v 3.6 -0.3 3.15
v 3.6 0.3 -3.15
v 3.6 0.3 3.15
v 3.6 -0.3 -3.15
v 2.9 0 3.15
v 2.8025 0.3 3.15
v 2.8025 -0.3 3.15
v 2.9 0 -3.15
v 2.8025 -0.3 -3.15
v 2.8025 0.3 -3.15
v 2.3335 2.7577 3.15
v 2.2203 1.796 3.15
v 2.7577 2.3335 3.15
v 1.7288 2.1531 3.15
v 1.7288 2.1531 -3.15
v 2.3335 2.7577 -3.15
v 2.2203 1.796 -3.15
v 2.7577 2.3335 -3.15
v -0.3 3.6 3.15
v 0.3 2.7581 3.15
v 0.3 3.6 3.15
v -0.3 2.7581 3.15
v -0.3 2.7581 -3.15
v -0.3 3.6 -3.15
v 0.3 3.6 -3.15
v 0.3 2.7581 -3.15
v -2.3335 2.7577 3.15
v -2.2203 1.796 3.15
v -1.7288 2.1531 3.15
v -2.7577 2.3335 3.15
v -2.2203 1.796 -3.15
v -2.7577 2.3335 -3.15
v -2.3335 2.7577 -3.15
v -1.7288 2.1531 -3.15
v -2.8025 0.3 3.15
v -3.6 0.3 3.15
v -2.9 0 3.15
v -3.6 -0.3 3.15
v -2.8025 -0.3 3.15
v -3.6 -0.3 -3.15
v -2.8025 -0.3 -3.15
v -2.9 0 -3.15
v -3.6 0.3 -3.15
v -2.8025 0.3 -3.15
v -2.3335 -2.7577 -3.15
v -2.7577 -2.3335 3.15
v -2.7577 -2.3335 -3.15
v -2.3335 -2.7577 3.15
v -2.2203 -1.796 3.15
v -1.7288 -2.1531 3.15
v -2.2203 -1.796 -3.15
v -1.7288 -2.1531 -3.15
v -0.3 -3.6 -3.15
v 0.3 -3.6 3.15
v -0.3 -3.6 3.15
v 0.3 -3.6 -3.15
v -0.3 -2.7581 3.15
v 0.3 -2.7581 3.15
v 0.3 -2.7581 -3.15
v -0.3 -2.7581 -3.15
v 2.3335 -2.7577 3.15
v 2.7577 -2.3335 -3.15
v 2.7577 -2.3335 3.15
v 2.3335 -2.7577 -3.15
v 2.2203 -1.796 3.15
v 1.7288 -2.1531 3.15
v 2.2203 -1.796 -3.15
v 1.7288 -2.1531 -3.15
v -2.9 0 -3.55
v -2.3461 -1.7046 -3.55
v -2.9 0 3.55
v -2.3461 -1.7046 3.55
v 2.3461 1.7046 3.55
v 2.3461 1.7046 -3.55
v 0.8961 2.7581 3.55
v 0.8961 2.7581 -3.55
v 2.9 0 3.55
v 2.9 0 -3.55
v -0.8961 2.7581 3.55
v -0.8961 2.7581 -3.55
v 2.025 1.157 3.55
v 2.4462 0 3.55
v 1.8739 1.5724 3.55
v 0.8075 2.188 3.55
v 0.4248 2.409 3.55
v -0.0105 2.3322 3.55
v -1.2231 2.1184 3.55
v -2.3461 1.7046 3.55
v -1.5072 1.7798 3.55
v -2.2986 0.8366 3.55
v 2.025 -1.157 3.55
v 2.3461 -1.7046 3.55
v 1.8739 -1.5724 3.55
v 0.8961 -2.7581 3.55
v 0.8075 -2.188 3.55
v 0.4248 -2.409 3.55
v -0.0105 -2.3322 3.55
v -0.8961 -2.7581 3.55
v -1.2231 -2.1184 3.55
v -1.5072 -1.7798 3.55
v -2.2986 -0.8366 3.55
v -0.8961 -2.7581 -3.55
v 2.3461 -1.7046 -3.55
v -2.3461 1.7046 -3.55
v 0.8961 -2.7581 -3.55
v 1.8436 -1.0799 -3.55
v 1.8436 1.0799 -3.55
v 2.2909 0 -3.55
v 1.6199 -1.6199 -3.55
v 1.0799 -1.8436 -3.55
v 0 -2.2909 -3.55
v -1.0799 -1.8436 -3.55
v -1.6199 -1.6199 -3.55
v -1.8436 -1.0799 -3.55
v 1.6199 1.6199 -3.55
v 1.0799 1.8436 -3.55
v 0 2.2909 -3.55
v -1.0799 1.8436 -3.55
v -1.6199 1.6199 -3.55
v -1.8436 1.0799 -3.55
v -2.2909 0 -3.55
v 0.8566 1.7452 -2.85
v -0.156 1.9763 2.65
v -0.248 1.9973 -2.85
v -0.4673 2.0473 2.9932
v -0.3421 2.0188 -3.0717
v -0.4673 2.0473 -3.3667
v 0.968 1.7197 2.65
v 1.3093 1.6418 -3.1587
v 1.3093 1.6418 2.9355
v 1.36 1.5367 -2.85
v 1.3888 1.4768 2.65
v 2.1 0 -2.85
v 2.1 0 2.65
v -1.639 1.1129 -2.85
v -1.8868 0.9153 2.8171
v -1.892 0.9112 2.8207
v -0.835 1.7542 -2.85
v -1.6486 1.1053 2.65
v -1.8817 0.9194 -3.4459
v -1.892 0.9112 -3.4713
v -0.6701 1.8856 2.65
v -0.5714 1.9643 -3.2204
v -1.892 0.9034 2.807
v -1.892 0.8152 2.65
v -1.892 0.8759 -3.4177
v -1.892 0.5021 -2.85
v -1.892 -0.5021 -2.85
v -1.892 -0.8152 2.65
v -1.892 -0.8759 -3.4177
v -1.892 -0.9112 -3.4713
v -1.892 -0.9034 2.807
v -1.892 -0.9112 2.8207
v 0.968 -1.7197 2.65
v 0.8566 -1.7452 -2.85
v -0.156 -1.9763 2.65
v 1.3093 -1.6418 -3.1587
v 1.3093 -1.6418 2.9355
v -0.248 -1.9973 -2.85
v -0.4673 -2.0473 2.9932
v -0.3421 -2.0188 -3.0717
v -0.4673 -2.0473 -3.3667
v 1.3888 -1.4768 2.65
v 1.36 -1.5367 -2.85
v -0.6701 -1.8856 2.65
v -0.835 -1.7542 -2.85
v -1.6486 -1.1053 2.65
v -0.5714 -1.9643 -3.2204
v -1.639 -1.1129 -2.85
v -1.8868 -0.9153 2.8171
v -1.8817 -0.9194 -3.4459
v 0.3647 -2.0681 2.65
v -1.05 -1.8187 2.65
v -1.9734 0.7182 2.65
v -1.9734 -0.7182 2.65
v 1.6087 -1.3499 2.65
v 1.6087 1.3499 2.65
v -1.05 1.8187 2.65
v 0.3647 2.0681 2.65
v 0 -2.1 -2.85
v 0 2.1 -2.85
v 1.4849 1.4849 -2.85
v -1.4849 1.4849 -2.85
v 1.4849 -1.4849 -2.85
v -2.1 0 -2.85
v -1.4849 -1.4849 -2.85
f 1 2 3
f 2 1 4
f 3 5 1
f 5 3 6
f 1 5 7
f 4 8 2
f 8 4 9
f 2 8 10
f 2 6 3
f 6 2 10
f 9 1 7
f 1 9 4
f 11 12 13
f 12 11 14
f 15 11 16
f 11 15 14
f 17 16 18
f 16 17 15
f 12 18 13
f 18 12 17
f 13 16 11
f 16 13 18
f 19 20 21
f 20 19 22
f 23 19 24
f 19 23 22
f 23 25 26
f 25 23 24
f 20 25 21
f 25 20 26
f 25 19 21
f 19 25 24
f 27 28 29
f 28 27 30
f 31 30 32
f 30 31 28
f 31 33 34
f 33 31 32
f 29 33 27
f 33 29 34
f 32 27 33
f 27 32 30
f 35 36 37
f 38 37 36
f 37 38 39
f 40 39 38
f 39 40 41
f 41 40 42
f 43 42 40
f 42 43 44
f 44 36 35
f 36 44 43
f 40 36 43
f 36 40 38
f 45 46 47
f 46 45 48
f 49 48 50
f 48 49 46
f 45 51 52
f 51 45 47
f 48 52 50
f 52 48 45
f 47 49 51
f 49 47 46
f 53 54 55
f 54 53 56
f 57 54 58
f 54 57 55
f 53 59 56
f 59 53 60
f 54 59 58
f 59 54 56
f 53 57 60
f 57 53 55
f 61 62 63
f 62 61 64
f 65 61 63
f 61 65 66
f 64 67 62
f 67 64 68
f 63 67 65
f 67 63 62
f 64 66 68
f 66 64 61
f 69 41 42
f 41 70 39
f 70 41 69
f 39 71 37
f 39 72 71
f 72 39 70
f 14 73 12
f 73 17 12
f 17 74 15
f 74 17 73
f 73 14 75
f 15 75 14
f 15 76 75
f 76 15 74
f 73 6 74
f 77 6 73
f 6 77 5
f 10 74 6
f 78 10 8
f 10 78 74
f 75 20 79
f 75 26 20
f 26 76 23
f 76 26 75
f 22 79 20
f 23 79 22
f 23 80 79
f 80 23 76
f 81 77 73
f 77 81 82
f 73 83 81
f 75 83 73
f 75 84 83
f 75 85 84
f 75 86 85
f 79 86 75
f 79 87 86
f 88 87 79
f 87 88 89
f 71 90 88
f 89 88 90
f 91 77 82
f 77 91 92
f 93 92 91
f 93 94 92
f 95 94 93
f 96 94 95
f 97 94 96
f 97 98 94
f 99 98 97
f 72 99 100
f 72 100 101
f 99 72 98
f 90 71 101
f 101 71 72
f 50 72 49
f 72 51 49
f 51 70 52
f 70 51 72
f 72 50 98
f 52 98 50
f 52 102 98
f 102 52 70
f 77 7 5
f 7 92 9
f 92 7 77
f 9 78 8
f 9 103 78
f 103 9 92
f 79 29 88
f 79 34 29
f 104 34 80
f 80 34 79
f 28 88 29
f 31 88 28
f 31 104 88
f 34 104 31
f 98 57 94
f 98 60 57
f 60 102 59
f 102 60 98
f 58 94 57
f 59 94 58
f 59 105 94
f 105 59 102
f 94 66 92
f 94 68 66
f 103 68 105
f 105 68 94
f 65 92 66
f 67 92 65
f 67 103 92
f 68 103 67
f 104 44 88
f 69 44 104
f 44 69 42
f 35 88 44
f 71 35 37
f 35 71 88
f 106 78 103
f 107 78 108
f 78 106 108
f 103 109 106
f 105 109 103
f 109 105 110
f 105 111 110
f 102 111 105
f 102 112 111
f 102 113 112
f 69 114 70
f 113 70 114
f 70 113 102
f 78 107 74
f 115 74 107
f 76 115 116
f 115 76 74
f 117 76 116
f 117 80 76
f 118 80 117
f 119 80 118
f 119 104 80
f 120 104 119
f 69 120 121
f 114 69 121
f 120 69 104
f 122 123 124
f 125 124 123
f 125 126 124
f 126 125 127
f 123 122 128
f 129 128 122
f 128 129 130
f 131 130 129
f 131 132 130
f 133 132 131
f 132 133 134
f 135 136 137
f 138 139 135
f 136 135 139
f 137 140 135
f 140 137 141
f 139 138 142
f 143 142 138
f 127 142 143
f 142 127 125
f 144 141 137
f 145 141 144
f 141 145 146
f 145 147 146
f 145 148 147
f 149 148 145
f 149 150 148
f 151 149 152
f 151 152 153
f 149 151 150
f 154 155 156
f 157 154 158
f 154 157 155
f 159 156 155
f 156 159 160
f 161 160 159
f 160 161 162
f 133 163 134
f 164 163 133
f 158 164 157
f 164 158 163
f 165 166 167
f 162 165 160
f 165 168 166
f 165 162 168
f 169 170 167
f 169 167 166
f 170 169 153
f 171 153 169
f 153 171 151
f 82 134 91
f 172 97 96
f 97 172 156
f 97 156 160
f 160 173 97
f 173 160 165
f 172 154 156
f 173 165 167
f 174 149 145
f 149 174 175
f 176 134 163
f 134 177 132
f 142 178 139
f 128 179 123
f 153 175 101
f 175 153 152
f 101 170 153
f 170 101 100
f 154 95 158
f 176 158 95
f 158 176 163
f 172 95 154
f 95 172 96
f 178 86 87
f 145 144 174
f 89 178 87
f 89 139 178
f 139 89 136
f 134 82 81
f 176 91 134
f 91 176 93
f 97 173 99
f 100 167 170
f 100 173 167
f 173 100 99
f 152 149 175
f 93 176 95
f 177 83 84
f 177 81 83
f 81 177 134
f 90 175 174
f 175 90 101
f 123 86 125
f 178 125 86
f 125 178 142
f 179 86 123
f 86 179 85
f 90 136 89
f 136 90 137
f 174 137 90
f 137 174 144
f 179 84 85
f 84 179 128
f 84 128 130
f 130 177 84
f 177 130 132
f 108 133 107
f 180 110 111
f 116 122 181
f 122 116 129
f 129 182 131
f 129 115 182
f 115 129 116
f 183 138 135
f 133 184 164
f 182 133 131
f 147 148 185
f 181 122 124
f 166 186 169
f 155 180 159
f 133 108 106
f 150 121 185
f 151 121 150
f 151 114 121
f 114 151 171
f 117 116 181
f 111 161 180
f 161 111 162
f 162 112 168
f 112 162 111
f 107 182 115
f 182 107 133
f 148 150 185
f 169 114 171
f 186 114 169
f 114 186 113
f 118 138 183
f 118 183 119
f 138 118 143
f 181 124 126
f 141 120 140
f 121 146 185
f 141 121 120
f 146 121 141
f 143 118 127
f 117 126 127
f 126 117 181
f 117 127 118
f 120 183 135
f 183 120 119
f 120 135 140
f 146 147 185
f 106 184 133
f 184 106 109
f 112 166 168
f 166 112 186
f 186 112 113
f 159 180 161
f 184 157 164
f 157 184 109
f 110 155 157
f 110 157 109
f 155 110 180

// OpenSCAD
// Parameters
outer_diameter_mm = 5.8; //[2.9:11.6:0.1]
length_mm = 7.1; //[3.55:14.2:0.1]
screw_diameter_mm = 5; //[2.5:10:0.1]
internal_thread_pitch_mm = 0.8; //[0.4:1.6:0.05]
center_bore_minor_diameter_mm = 4.2; //[2.1:8.4:0.05]
entry_chamfer_height_mm = 0.5; //[0.25:1:0.05]
entry_chamfer_angle_deg = 45; //[15:75:1]
bottom_chamfer_height_mm = 0.3; //[0.15:0.6:0.05]
bottom_chamfer_angle_deg = 30; //[15:60:1]
knurl_depth_mm = 0.3; //[0.15:0.6:0.05]
knurl_pitch_mm = 0.8; //[0.4:1.6:0.05]
tolerance_outer_diameter_mm = 0; //[-0.2:0.2:0.01]
tolerance_length_mm = 0; //[-0.3:0.3:0.01]
overlap_mm = 0.8; //[0.5:2:0.1]
knurl_rib_count = 8; //[4:16:1]
knurl_rib_width_mm = 0.6; //[0.3:1.2:0.05]

// Threaded Insert - complete geometry
module threaded_insert() {
  color("Brass") {
    // Insert Body
    difference() {
      union() {
        // Main cylindrical body
        cylinder(
          r=(outer_diameter_mm + tolerance_outer_diameter_mm) / 2,
          h=length_mm + tolerance_length_mm,
          center=true
        );

        // Knurl ribs
        for (i = [0:knurl_rib_count-1]) {
          rotate([0, 0, i * 360 / knurl_rib_count])
          translate([
            (outer_diameter_mm + tolerance_outer_diameter_mm) / 2 - overlap_mm / 2 + (knurl_depth_mm + overlap_mm) / 2,
            0,
            0
          ])
          cube([
            knurl_depth_mm + overlap_mm,
            knurl_rib_width_mm,
            (length_mm + tolerance_length_mm) - entry_chamfer_height_mm - bottom_chamfer_height_mm
          ], center=true);
        }
      }

      // Internal thread bore
      cylinder(
        r=center_bore_minor_diameter_mm / 2,
        h=(length_mm + tolerance_length_mm) + 2 * overlap_mm,
        center=true
      );

      // Entry chamfer
      translate([0, 0, (length_mm + tolerance_length_mm) / 2 - entry_chamfer_height_mm / 2])
      rotate([180, 0, 0])
      cylinder(
        r1=(center_bore_minor_diameter_mm / 2) + entry_chamfer_height_mm,
        r2=center_bore_minor_diameter_mm / 2,
        h=entry_chamfer_height_mm + overlap_mm,
        center=true
      );

      // Bottom chamfer
      translate([0, 0, -(length_mm + tolerance_length_mm) / 2 + bottom_chamfer_height_mm / 2])
      cylinder(
        r1=(center_bore_minor_diameter_mm / 2) + bottom_chamfer_height_mm,
        r2=center_bore_minor_diameter_mm / 2,
        h=bottom_chamfer_height_mm + overlap_mm,
        center=true
      );
    }
  }
}

// Assembly
module assembly() {
  threaded_insert();
}

assembly();
